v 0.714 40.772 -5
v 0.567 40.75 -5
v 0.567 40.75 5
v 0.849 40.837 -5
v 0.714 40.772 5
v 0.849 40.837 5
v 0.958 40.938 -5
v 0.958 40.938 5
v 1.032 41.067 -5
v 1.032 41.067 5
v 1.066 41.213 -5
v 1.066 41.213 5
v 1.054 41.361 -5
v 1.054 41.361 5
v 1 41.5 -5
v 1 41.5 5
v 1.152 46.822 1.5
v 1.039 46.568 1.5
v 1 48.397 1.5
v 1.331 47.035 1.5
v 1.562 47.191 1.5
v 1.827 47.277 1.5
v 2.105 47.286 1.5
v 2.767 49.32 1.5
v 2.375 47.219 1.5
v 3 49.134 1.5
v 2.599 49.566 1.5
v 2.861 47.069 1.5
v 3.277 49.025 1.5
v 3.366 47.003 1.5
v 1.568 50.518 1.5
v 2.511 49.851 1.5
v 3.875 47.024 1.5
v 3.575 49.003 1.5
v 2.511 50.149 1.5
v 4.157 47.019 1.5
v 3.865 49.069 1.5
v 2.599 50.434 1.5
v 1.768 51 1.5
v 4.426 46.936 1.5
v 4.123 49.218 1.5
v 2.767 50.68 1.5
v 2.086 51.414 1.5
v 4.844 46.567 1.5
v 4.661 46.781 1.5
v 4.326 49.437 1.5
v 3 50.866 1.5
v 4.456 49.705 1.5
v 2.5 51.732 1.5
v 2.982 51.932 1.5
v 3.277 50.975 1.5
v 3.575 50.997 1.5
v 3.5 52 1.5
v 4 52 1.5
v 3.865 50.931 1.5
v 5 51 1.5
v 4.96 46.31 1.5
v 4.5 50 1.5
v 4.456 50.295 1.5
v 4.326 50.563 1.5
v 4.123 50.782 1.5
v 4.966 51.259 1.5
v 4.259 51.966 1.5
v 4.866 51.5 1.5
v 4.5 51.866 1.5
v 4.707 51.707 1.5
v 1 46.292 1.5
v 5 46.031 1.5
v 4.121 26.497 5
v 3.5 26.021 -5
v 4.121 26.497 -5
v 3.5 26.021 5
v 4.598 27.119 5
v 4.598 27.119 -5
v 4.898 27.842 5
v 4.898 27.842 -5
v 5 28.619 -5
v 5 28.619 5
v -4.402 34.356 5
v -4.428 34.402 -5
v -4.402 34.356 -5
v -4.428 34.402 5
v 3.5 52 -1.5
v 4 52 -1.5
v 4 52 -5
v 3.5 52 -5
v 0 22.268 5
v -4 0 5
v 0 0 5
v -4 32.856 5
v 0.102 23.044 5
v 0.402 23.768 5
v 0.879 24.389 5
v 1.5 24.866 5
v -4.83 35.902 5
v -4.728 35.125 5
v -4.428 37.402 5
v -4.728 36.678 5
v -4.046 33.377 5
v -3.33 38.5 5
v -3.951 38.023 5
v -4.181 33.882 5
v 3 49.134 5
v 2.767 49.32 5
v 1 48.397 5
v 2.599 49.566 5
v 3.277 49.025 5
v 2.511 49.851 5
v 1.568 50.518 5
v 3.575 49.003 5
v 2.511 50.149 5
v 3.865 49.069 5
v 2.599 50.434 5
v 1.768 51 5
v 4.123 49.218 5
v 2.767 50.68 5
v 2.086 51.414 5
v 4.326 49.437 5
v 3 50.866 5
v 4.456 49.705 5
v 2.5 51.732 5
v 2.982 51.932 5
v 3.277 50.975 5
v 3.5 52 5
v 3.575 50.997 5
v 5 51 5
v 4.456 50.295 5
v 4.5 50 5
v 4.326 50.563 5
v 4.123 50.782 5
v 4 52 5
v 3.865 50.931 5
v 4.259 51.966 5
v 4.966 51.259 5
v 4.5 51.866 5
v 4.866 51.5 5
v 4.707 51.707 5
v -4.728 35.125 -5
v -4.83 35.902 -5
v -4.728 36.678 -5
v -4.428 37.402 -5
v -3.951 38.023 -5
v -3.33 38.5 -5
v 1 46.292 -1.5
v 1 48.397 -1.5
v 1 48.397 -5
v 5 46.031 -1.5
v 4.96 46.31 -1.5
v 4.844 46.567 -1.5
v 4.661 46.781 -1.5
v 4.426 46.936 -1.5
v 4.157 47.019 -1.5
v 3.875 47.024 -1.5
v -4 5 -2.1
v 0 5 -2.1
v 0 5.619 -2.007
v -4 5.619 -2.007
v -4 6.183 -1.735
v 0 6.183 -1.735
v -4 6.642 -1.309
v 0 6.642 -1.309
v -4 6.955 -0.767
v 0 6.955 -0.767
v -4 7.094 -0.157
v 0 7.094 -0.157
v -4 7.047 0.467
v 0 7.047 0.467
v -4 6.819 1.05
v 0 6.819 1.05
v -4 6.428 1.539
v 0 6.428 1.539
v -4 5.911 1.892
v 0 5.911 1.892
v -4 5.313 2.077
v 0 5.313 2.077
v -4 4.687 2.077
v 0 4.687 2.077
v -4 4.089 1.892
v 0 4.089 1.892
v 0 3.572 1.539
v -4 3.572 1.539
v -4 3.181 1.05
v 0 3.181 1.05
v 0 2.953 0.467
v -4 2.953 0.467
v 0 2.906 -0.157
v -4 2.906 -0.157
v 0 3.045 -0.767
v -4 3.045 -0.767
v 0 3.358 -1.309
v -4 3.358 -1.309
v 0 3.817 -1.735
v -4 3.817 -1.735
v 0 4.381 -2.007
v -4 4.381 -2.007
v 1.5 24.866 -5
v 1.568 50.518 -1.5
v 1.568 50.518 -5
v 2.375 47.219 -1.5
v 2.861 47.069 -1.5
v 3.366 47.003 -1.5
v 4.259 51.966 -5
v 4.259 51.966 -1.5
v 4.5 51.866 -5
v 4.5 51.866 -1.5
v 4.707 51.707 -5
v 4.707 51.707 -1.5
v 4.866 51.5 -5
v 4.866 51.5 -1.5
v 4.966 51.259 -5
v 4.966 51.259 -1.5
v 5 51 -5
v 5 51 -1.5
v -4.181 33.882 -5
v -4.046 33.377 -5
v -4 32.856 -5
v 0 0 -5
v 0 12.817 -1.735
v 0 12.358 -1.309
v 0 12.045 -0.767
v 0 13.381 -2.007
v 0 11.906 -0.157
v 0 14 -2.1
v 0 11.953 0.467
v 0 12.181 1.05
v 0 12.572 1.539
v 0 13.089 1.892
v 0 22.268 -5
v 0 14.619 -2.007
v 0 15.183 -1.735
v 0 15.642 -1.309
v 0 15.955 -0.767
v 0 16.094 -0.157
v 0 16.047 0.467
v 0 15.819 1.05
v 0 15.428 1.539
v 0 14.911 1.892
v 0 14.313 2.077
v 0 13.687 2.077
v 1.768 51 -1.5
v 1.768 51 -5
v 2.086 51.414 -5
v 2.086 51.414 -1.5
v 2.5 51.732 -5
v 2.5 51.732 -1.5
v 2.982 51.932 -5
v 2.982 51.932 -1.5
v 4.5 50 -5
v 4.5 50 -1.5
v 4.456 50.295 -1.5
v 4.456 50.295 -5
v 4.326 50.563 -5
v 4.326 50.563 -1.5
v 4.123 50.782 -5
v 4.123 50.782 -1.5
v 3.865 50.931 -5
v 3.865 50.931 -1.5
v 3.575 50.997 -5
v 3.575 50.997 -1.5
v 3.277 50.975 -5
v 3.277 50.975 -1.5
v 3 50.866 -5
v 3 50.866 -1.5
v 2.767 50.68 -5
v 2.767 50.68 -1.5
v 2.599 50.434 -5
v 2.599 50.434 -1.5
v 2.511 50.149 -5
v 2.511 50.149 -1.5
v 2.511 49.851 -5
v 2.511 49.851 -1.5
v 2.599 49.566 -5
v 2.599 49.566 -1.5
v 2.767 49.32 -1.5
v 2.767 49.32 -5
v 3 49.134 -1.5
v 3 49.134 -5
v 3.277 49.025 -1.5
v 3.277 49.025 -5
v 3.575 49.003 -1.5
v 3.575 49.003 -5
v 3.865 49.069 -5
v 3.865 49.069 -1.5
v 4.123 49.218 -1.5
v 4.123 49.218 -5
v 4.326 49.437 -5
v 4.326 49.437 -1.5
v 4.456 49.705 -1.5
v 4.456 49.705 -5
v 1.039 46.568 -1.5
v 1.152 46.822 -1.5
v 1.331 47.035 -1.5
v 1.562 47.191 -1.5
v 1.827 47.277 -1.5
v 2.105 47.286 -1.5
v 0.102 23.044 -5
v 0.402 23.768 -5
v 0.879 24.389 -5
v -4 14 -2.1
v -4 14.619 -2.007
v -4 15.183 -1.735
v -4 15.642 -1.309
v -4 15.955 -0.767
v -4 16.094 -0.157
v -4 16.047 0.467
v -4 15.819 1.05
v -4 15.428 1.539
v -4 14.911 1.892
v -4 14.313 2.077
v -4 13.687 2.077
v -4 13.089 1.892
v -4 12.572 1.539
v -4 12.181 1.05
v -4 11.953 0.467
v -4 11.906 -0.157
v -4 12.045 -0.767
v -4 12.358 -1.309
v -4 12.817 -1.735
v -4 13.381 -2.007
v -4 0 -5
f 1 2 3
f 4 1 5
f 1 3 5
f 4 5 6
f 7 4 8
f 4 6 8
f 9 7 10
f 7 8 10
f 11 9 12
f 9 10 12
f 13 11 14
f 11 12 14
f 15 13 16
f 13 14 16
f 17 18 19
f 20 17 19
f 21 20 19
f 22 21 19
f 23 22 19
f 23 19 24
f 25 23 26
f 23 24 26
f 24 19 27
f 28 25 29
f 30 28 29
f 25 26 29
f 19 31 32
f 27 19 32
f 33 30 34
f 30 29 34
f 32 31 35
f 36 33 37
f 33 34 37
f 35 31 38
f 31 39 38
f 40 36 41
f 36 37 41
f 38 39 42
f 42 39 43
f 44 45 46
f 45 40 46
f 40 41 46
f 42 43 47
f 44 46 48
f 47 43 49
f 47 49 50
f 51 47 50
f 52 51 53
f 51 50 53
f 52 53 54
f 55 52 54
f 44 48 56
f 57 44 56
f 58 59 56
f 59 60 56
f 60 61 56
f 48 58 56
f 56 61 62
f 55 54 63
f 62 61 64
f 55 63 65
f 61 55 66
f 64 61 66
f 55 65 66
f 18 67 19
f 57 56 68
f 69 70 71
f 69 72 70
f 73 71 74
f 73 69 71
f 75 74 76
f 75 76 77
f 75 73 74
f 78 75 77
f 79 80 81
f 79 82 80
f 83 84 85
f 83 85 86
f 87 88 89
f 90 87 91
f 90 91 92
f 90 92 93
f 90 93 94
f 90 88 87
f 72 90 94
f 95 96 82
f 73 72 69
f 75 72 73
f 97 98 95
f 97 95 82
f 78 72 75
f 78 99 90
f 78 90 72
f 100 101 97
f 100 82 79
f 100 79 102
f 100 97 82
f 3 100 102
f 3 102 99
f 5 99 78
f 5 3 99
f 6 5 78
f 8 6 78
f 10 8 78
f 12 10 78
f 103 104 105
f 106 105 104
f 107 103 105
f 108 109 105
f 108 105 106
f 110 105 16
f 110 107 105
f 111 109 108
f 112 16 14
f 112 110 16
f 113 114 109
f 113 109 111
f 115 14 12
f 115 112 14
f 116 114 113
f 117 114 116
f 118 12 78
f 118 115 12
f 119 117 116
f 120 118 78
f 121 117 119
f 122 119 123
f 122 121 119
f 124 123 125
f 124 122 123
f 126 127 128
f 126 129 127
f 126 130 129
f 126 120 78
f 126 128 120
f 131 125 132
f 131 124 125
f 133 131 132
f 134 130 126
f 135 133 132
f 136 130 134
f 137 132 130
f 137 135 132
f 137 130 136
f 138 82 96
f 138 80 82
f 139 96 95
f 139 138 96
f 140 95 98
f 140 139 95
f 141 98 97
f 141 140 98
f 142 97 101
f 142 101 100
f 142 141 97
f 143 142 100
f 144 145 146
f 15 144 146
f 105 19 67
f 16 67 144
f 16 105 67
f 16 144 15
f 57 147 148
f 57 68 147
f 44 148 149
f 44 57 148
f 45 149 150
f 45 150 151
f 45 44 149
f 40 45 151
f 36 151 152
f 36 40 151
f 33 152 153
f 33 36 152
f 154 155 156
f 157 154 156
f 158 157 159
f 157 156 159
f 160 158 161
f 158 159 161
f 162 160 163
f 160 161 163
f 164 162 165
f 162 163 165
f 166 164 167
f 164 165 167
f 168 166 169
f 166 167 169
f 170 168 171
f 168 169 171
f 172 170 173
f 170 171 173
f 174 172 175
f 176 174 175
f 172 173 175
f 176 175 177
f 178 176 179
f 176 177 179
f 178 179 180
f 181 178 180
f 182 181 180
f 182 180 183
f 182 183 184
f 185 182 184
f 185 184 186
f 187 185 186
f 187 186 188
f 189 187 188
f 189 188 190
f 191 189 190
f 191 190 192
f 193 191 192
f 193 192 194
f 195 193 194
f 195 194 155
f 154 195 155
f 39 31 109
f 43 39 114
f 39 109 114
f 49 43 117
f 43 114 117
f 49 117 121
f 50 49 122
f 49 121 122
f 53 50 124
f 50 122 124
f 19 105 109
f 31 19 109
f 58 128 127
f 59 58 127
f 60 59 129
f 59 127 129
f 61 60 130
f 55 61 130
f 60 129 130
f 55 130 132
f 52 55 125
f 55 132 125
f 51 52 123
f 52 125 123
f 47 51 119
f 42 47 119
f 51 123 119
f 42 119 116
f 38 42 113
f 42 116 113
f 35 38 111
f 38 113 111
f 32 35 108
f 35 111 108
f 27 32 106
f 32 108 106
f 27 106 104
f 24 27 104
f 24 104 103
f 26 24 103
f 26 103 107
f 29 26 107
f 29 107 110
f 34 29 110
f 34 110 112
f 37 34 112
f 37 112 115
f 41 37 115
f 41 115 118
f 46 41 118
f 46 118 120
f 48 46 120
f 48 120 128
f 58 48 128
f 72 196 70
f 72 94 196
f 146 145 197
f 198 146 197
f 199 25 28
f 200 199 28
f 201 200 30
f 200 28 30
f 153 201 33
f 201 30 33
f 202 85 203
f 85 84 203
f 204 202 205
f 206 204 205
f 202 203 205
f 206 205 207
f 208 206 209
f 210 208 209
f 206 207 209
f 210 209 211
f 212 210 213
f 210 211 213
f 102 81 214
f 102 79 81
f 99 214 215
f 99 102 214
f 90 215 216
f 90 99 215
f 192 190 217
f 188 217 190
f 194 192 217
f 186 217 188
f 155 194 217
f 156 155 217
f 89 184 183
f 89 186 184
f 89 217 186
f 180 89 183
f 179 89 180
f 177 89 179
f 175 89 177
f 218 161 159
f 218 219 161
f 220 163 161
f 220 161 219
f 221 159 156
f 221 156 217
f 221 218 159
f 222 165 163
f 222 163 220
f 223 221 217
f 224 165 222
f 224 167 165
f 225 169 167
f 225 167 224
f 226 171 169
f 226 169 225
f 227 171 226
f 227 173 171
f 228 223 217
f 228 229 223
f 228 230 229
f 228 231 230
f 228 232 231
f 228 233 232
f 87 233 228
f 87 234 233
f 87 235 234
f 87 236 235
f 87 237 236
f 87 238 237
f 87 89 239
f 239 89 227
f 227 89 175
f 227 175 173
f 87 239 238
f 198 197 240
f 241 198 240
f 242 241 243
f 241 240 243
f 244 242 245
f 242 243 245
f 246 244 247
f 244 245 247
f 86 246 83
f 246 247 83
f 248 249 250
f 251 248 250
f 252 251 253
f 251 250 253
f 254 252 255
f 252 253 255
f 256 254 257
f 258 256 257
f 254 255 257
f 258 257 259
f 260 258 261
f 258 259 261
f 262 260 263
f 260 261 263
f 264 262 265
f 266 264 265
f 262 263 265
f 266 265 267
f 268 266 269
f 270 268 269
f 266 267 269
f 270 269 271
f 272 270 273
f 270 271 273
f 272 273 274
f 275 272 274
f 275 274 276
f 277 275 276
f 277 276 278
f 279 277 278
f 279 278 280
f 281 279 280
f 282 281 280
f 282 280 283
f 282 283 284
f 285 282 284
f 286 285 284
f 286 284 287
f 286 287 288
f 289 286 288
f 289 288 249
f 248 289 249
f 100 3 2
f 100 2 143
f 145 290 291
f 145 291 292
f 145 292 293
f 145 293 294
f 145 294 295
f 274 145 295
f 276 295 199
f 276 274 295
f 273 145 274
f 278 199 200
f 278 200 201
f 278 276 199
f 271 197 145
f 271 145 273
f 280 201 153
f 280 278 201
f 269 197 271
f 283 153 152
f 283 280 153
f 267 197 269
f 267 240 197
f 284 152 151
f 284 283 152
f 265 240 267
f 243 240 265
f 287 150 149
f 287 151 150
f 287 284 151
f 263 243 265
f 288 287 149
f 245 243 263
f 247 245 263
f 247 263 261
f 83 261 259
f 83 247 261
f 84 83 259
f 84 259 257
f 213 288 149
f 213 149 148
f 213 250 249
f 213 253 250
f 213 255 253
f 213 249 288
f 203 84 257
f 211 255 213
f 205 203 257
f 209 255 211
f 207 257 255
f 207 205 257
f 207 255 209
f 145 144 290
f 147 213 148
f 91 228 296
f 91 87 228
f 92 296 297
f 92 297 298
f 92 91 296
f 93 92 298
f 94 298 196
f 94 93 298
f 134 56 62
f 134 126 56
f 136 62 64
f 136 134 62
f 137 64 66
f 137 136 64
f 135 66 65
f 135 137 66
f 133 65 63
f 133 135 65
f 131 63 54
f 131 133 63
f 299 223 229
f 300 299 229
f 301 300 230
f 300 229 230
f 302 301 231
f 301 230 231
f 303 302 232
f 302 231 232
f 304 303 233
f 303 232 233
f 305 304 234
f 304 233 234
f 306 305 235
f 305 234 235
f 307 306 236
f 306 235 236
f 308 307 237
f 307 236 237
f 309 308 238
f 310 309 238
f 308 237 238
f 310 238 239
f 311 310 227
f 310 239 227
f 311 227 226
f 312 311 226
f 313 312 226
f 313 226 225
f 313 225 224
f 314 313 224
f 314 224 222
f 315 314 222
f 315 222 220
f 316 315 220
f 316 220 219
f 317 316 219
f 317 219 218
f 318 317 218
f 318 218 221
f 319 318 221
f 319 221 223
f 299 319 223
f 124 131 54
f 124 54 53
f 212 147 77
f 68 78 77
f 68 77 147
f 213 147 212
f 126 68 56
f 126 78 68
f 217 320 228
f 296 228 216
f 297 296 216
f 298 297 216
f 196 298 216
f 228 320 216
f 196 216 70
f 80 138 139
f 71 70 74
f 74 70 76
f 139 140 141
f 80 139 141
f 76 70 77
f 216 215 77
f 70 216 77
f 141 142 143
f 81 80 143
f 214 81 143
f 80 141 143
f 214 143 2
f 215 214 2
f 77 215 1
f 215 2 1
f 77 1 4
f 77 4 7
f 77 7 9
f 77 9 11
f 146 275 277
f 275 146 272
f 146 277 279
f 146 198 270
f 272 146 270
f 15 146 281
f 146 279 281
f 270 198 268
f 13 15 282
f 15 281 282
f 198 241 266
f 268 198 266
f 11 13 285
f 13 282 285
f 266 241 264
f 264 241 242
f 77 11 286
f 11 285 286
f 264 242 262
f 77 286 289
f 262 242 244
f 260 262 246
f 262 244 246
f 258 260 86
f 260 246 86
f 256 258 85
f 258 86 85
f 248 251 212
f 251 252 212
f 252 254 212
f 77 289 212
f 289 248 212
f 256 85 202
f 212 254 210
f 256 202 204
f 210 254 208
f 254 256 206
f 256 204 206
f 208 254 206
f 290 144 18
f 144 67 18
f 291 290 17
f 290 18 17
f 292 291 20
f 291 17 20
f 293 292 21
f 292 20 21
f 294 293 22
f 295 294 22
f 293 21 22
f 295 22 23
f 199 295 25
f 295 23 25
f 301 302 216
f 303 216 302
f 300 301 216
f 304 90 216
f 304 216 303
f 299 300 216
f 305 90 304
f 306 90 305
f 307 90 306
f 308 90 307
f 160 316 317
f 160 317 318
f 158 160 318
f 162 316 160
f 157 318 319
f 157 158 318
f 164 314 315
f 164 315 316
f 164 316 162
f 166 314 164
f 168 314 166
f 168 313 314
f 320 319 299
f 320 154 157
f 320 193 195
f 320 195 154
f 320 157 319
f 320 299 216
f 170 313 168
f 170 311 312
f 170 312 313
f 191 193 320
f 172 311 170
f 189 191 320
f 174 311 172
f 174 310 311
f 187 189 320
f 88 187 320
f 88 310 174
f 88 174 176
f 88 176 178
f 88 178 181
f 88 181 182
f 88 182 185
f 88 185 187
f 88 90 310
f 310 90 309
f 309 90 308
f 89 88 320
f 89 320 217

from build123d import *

# Parameters (mm, degrees)
EXTRUDE_1_DEPTH     = 5
SKETCH_2_R          = 2.1
CUT_EXTRUDE_1_DEPTH = 53.575123334
SKETCH_3_R          = 1
SKETCH_3_R_2        = 0.5
CUT_EXTRUDE_2_DEPTH = 54.283614682
SKETCH_4_R          = 3
CUT_EXTRUDE_3_DEPTH = 1.5
FILLET_1_R          = 3
FILLET_4_R          = 1


with BuildPart() as part:
    # 草图1 → 凸台-拉伸1 (new, symmetric)
    with BuildSketch(Plane.XY):
        Polygon((-5.92820323, 37), (-4, 33.660254038), (-4, 0), (0, 0), (0, 24), (5, 26.886751346), (5, 52), (1, 52), (1, 41), align=None)
    extrude(amount=EXTRUDE_1_DEPTH, both=True)

    # 草图2 → 切除-拉伸1 (cut, through all)
    with BuildSketch(Plane(origin=(0, 0, 0), x_dir=(0, 0, -1), z_dir=(1, 0, 0))):
        with Locations((0, 14)):
            Circle(SKETCH_2_R)
        with Locations((0, 5)):
            Circle(SKETCH_2_R)
    extrude(amount=-CUT_EXTRUDE_1_DEPTH, mode=Mode.SUBTRACT)

    # 草图3 → 切除-拉伸2 (cut, through all)
    with BuildSketch(Plane.XY.offset(5)):
        with Locations((3.5, 50)):
            Circle(SKETCH_3_R)
        with Locations((0.566987298, 41.25)):
            Circle(SKETCH_3_R_2)
        with BuildLine():
            Line((3.5, 52), (5, 52))
            Line((5, 52), (5, 52.5))
            Line((5, 52.5), (1, 52.5))
            Line((1, 52.5), (1, 48.397279591))
            Line((1, 48.397279591), (1.568148347, 50.51763809))
            ThreePointArc((1.568148347, 50.51763809), (2.282477142, 51.586706681), (3.5, 52))
        make_face()
    extrude(amount=-CUT_EXTRUDE_2_DEPTH, mode=Mode.SUBTRACT)

    # 草图4 → 切除-拉伸3 (cut, symmetric)
    with BuildSketch(Plane.XY):
        with Locations((3.5, 50)):
            Circle(SKETCH_4_R)
    extrude(amount=CUT_EXTRUDE_3_DEPTH, both=True, mode=Mode.SUBTRACT)

    # 圆角1
    fillet_1_edges = [part.edges().sort_by_distance(p)[0] for p in [
        (0, 24, 0),
        (-4, 33.660254038, 0),
        (-5.92820323, 37, 0),
        (5, 26.886751346, 0),
    ]]
    fillet(fillet_1_edges, radius=FILLET_1_R)

    # 圆角4
    fillet_4_edges = [part.edges().sort_by_distance(p)[0] for p in [
        (5, 52, 3.25),
        (1, 48.341687605, 0),
        (5, 52, -3.25),
        (5, 47.401923789, 0),
    ]]
    fillet(fillet_4_edges, radius=FILLET_4_R)


solid = part.part
